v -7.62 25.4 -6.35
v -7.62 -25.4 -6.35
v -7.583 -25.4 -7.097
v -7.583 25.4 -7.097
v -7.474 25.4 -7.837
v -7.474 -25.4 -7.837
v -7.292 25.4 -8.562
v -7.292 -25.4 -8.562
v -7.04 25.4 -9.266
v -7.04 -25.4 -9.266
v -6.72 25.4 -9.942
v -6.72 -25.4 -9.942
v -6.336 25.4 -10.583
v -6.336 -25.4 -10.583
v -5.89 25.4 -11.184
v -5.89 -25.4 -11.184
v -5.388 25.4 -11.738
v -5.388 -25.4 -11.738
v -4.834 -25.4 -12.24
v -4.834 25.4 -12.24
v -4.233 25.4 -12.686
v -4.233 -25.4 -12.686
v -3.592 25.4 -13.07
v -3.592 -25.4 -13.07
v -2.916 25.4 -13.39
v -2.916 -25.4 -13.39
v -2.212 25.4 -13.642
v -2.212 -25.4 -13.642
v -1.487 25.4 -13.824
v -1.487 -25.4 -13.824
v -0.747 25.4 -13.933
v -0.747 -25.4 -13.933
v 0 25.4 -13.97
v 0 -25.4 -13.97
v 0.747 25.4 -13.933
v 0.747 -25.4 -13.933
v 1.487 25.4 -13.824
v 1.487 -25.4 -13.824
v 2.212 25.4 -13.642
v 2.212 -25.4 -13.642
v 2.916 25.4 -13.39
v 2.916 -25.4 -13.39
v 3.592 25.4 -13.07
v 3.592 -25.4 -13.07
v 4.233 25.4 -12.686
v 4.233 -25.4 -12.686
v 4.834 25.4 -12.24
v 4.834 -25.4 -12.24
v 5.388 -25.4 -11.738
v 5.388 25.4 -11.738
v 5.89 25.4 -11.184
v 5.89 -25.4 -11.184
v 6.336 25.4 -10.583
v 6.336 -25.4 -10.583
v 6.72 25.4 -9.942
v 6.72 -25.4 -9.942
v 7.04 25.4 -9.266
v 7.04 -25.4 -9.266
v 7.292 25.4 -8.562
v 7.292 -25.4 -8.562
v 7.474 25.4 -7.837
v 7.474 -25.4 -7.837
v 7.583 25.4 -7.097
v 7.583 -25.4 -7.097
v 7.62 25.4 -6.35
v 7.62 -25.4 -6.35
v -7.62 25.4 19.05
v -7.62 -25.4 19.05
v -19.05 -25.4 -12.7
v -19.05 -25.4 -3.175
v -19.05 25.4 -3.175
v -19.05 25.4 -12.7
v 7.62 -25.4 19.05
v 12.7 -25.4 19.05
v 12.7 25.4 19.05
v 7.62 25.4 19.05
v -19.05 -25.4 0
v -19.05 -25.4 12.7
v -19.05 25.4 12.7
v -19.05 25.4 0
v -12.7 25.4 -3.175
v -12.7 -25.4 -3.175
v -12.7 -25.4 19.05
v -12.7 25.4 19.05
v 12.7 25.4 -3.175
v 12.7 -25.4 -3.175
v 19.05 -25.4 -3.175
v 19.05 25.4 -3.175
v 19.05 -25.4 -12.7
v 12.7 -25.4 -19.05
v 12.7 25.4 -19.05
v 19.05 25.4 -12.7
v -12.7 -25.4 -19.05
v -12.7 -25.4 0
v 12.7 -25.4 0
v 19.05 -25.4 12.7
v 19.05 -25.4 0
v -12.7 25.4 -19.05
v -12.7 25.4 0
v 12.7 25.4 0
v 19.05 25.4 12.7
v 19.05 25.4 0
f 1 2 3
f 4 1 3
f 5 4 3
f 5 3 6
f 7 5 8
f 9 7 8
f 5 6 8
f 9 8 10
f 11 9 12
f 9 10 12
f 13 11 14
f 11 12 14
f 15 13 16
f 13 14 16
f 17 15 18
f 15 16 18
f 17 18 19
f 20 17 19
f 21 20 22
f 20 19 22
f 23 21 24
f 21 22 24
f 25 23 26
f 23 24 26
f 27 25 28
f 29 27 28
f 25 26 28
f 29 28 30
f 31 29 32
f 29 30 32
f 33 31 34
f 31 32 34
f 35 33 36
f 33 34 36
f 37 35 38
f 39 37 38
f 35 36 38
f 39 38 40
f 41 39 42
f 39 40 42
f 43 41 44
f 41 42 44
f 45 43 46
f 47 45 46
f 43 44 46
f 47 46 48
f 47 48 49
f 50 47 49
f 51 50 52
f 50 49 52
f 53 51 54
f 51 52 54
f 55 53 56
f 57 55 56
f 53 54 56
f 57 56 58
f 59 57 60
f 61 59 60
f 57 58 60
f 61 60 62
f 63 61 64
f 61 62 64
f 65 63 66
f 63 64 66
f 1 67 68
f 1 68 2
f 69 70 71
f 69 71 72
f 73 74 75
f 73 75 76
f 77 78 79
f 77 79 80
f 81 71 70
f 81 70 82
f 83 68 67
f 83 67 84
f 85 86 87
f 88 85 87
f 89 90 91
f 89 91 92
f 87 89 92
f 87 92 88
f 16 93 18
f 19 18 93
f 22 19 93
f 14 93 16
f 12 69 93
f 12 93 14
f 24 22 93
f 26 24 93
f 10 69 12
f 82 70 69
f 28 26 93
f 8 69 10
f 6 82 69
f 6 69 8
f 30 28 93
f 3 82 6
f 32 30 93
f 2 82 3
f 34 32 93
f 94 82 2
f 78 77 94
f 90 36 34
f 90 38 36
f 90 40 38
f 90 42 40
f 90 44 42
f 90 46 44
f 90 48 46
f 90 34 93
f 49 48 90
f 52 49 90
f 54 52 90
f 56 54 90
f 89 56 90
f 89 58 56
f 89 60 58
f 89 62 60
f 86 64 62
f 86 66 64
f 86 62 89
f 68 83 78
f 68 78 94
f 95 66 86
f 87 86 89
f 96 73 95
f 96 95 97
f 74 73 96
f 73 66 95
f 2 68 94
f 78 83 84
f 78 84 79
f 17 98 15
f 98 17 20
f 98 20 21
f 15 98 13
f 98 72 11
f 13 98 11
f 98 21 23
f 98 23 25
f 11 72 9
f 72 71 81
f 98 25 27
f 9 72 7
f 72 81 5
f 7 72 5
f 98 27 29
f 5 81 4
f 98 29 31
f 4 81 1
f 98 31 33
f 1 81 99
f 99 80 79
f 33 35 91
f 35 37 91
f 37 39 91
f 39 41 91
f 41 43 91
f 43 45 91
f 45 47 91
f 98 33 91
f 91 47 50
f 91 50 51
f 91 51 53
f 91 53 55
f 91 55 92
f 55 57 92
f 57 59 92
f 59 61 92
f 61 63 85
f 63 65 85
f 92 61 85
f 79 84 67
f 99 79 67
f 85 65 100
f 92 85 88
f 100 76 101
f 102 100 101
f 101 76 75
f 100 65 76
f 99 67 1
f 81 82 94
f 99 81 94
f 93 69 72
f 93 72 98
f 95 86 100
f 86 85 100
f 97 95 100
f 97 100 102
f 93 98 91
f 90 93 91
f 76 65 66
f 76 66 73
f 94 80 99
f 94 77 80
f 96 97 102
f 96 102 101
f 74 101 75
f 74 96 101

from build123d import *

# Parameters (mm, degrees)
F3_DEPTH = 25.4
F2_W     = 6.35
F2_H     = 3.175
F1_W     = 6.35
F1_H     = 3.175
F4_DEPTH = 25.4
F6_DEPTH = 25.4


with BuildPart() as f3:
    # F0 (on Front) → F3 (new body, symmetric)
    with BuildSketch(Plane.XZ):
        Polygon((12.7, 19.05), (-12.7, 19.05), (-19.05, 12.7), (-19.05, -12.7), (-12.7, -19.05), (12.7, -19.05), (19.05, -12.7), (19.05, 12.7), align=None)
    extrude(amount=F3_DEPTH, both=True)

    # F2 (on Front) + F1 (on Front) → F4 (cut, symmetric)
    with BuildSketch(Plane.XZ):
        with Locations((15.875, -1.5875)):
            Rectangle(F2_W, F2_H)
    with BuildSketch(Plane.XZ):
        with Locations((-15.875, -1.5875)):
            Rectangle(F1_W, F1_H)
    extrude(amount=F4_DEPTH, both=True, mode=Mode.SUBTRACT)

    # F5 (on Front) → F6 (cut, symmetric)
    with BuildSketch(Plane.XZ):
        with BuildLine():
            Line((7.62, 19.05), (-7.62, 19.05))
            Line((-7.62, 19.05), (-7.62, -6.35))
            ThreePointArc((-7.62, -6.35), (0, -13.97), (7.62, -6.35))
            Line((7.62, -6.35), (7.62, 19.05))
        make_face()
    extrude(amount=F6_DEPTH, both=True, mode=Mode.SUBTRACT)


solid = f3.part
